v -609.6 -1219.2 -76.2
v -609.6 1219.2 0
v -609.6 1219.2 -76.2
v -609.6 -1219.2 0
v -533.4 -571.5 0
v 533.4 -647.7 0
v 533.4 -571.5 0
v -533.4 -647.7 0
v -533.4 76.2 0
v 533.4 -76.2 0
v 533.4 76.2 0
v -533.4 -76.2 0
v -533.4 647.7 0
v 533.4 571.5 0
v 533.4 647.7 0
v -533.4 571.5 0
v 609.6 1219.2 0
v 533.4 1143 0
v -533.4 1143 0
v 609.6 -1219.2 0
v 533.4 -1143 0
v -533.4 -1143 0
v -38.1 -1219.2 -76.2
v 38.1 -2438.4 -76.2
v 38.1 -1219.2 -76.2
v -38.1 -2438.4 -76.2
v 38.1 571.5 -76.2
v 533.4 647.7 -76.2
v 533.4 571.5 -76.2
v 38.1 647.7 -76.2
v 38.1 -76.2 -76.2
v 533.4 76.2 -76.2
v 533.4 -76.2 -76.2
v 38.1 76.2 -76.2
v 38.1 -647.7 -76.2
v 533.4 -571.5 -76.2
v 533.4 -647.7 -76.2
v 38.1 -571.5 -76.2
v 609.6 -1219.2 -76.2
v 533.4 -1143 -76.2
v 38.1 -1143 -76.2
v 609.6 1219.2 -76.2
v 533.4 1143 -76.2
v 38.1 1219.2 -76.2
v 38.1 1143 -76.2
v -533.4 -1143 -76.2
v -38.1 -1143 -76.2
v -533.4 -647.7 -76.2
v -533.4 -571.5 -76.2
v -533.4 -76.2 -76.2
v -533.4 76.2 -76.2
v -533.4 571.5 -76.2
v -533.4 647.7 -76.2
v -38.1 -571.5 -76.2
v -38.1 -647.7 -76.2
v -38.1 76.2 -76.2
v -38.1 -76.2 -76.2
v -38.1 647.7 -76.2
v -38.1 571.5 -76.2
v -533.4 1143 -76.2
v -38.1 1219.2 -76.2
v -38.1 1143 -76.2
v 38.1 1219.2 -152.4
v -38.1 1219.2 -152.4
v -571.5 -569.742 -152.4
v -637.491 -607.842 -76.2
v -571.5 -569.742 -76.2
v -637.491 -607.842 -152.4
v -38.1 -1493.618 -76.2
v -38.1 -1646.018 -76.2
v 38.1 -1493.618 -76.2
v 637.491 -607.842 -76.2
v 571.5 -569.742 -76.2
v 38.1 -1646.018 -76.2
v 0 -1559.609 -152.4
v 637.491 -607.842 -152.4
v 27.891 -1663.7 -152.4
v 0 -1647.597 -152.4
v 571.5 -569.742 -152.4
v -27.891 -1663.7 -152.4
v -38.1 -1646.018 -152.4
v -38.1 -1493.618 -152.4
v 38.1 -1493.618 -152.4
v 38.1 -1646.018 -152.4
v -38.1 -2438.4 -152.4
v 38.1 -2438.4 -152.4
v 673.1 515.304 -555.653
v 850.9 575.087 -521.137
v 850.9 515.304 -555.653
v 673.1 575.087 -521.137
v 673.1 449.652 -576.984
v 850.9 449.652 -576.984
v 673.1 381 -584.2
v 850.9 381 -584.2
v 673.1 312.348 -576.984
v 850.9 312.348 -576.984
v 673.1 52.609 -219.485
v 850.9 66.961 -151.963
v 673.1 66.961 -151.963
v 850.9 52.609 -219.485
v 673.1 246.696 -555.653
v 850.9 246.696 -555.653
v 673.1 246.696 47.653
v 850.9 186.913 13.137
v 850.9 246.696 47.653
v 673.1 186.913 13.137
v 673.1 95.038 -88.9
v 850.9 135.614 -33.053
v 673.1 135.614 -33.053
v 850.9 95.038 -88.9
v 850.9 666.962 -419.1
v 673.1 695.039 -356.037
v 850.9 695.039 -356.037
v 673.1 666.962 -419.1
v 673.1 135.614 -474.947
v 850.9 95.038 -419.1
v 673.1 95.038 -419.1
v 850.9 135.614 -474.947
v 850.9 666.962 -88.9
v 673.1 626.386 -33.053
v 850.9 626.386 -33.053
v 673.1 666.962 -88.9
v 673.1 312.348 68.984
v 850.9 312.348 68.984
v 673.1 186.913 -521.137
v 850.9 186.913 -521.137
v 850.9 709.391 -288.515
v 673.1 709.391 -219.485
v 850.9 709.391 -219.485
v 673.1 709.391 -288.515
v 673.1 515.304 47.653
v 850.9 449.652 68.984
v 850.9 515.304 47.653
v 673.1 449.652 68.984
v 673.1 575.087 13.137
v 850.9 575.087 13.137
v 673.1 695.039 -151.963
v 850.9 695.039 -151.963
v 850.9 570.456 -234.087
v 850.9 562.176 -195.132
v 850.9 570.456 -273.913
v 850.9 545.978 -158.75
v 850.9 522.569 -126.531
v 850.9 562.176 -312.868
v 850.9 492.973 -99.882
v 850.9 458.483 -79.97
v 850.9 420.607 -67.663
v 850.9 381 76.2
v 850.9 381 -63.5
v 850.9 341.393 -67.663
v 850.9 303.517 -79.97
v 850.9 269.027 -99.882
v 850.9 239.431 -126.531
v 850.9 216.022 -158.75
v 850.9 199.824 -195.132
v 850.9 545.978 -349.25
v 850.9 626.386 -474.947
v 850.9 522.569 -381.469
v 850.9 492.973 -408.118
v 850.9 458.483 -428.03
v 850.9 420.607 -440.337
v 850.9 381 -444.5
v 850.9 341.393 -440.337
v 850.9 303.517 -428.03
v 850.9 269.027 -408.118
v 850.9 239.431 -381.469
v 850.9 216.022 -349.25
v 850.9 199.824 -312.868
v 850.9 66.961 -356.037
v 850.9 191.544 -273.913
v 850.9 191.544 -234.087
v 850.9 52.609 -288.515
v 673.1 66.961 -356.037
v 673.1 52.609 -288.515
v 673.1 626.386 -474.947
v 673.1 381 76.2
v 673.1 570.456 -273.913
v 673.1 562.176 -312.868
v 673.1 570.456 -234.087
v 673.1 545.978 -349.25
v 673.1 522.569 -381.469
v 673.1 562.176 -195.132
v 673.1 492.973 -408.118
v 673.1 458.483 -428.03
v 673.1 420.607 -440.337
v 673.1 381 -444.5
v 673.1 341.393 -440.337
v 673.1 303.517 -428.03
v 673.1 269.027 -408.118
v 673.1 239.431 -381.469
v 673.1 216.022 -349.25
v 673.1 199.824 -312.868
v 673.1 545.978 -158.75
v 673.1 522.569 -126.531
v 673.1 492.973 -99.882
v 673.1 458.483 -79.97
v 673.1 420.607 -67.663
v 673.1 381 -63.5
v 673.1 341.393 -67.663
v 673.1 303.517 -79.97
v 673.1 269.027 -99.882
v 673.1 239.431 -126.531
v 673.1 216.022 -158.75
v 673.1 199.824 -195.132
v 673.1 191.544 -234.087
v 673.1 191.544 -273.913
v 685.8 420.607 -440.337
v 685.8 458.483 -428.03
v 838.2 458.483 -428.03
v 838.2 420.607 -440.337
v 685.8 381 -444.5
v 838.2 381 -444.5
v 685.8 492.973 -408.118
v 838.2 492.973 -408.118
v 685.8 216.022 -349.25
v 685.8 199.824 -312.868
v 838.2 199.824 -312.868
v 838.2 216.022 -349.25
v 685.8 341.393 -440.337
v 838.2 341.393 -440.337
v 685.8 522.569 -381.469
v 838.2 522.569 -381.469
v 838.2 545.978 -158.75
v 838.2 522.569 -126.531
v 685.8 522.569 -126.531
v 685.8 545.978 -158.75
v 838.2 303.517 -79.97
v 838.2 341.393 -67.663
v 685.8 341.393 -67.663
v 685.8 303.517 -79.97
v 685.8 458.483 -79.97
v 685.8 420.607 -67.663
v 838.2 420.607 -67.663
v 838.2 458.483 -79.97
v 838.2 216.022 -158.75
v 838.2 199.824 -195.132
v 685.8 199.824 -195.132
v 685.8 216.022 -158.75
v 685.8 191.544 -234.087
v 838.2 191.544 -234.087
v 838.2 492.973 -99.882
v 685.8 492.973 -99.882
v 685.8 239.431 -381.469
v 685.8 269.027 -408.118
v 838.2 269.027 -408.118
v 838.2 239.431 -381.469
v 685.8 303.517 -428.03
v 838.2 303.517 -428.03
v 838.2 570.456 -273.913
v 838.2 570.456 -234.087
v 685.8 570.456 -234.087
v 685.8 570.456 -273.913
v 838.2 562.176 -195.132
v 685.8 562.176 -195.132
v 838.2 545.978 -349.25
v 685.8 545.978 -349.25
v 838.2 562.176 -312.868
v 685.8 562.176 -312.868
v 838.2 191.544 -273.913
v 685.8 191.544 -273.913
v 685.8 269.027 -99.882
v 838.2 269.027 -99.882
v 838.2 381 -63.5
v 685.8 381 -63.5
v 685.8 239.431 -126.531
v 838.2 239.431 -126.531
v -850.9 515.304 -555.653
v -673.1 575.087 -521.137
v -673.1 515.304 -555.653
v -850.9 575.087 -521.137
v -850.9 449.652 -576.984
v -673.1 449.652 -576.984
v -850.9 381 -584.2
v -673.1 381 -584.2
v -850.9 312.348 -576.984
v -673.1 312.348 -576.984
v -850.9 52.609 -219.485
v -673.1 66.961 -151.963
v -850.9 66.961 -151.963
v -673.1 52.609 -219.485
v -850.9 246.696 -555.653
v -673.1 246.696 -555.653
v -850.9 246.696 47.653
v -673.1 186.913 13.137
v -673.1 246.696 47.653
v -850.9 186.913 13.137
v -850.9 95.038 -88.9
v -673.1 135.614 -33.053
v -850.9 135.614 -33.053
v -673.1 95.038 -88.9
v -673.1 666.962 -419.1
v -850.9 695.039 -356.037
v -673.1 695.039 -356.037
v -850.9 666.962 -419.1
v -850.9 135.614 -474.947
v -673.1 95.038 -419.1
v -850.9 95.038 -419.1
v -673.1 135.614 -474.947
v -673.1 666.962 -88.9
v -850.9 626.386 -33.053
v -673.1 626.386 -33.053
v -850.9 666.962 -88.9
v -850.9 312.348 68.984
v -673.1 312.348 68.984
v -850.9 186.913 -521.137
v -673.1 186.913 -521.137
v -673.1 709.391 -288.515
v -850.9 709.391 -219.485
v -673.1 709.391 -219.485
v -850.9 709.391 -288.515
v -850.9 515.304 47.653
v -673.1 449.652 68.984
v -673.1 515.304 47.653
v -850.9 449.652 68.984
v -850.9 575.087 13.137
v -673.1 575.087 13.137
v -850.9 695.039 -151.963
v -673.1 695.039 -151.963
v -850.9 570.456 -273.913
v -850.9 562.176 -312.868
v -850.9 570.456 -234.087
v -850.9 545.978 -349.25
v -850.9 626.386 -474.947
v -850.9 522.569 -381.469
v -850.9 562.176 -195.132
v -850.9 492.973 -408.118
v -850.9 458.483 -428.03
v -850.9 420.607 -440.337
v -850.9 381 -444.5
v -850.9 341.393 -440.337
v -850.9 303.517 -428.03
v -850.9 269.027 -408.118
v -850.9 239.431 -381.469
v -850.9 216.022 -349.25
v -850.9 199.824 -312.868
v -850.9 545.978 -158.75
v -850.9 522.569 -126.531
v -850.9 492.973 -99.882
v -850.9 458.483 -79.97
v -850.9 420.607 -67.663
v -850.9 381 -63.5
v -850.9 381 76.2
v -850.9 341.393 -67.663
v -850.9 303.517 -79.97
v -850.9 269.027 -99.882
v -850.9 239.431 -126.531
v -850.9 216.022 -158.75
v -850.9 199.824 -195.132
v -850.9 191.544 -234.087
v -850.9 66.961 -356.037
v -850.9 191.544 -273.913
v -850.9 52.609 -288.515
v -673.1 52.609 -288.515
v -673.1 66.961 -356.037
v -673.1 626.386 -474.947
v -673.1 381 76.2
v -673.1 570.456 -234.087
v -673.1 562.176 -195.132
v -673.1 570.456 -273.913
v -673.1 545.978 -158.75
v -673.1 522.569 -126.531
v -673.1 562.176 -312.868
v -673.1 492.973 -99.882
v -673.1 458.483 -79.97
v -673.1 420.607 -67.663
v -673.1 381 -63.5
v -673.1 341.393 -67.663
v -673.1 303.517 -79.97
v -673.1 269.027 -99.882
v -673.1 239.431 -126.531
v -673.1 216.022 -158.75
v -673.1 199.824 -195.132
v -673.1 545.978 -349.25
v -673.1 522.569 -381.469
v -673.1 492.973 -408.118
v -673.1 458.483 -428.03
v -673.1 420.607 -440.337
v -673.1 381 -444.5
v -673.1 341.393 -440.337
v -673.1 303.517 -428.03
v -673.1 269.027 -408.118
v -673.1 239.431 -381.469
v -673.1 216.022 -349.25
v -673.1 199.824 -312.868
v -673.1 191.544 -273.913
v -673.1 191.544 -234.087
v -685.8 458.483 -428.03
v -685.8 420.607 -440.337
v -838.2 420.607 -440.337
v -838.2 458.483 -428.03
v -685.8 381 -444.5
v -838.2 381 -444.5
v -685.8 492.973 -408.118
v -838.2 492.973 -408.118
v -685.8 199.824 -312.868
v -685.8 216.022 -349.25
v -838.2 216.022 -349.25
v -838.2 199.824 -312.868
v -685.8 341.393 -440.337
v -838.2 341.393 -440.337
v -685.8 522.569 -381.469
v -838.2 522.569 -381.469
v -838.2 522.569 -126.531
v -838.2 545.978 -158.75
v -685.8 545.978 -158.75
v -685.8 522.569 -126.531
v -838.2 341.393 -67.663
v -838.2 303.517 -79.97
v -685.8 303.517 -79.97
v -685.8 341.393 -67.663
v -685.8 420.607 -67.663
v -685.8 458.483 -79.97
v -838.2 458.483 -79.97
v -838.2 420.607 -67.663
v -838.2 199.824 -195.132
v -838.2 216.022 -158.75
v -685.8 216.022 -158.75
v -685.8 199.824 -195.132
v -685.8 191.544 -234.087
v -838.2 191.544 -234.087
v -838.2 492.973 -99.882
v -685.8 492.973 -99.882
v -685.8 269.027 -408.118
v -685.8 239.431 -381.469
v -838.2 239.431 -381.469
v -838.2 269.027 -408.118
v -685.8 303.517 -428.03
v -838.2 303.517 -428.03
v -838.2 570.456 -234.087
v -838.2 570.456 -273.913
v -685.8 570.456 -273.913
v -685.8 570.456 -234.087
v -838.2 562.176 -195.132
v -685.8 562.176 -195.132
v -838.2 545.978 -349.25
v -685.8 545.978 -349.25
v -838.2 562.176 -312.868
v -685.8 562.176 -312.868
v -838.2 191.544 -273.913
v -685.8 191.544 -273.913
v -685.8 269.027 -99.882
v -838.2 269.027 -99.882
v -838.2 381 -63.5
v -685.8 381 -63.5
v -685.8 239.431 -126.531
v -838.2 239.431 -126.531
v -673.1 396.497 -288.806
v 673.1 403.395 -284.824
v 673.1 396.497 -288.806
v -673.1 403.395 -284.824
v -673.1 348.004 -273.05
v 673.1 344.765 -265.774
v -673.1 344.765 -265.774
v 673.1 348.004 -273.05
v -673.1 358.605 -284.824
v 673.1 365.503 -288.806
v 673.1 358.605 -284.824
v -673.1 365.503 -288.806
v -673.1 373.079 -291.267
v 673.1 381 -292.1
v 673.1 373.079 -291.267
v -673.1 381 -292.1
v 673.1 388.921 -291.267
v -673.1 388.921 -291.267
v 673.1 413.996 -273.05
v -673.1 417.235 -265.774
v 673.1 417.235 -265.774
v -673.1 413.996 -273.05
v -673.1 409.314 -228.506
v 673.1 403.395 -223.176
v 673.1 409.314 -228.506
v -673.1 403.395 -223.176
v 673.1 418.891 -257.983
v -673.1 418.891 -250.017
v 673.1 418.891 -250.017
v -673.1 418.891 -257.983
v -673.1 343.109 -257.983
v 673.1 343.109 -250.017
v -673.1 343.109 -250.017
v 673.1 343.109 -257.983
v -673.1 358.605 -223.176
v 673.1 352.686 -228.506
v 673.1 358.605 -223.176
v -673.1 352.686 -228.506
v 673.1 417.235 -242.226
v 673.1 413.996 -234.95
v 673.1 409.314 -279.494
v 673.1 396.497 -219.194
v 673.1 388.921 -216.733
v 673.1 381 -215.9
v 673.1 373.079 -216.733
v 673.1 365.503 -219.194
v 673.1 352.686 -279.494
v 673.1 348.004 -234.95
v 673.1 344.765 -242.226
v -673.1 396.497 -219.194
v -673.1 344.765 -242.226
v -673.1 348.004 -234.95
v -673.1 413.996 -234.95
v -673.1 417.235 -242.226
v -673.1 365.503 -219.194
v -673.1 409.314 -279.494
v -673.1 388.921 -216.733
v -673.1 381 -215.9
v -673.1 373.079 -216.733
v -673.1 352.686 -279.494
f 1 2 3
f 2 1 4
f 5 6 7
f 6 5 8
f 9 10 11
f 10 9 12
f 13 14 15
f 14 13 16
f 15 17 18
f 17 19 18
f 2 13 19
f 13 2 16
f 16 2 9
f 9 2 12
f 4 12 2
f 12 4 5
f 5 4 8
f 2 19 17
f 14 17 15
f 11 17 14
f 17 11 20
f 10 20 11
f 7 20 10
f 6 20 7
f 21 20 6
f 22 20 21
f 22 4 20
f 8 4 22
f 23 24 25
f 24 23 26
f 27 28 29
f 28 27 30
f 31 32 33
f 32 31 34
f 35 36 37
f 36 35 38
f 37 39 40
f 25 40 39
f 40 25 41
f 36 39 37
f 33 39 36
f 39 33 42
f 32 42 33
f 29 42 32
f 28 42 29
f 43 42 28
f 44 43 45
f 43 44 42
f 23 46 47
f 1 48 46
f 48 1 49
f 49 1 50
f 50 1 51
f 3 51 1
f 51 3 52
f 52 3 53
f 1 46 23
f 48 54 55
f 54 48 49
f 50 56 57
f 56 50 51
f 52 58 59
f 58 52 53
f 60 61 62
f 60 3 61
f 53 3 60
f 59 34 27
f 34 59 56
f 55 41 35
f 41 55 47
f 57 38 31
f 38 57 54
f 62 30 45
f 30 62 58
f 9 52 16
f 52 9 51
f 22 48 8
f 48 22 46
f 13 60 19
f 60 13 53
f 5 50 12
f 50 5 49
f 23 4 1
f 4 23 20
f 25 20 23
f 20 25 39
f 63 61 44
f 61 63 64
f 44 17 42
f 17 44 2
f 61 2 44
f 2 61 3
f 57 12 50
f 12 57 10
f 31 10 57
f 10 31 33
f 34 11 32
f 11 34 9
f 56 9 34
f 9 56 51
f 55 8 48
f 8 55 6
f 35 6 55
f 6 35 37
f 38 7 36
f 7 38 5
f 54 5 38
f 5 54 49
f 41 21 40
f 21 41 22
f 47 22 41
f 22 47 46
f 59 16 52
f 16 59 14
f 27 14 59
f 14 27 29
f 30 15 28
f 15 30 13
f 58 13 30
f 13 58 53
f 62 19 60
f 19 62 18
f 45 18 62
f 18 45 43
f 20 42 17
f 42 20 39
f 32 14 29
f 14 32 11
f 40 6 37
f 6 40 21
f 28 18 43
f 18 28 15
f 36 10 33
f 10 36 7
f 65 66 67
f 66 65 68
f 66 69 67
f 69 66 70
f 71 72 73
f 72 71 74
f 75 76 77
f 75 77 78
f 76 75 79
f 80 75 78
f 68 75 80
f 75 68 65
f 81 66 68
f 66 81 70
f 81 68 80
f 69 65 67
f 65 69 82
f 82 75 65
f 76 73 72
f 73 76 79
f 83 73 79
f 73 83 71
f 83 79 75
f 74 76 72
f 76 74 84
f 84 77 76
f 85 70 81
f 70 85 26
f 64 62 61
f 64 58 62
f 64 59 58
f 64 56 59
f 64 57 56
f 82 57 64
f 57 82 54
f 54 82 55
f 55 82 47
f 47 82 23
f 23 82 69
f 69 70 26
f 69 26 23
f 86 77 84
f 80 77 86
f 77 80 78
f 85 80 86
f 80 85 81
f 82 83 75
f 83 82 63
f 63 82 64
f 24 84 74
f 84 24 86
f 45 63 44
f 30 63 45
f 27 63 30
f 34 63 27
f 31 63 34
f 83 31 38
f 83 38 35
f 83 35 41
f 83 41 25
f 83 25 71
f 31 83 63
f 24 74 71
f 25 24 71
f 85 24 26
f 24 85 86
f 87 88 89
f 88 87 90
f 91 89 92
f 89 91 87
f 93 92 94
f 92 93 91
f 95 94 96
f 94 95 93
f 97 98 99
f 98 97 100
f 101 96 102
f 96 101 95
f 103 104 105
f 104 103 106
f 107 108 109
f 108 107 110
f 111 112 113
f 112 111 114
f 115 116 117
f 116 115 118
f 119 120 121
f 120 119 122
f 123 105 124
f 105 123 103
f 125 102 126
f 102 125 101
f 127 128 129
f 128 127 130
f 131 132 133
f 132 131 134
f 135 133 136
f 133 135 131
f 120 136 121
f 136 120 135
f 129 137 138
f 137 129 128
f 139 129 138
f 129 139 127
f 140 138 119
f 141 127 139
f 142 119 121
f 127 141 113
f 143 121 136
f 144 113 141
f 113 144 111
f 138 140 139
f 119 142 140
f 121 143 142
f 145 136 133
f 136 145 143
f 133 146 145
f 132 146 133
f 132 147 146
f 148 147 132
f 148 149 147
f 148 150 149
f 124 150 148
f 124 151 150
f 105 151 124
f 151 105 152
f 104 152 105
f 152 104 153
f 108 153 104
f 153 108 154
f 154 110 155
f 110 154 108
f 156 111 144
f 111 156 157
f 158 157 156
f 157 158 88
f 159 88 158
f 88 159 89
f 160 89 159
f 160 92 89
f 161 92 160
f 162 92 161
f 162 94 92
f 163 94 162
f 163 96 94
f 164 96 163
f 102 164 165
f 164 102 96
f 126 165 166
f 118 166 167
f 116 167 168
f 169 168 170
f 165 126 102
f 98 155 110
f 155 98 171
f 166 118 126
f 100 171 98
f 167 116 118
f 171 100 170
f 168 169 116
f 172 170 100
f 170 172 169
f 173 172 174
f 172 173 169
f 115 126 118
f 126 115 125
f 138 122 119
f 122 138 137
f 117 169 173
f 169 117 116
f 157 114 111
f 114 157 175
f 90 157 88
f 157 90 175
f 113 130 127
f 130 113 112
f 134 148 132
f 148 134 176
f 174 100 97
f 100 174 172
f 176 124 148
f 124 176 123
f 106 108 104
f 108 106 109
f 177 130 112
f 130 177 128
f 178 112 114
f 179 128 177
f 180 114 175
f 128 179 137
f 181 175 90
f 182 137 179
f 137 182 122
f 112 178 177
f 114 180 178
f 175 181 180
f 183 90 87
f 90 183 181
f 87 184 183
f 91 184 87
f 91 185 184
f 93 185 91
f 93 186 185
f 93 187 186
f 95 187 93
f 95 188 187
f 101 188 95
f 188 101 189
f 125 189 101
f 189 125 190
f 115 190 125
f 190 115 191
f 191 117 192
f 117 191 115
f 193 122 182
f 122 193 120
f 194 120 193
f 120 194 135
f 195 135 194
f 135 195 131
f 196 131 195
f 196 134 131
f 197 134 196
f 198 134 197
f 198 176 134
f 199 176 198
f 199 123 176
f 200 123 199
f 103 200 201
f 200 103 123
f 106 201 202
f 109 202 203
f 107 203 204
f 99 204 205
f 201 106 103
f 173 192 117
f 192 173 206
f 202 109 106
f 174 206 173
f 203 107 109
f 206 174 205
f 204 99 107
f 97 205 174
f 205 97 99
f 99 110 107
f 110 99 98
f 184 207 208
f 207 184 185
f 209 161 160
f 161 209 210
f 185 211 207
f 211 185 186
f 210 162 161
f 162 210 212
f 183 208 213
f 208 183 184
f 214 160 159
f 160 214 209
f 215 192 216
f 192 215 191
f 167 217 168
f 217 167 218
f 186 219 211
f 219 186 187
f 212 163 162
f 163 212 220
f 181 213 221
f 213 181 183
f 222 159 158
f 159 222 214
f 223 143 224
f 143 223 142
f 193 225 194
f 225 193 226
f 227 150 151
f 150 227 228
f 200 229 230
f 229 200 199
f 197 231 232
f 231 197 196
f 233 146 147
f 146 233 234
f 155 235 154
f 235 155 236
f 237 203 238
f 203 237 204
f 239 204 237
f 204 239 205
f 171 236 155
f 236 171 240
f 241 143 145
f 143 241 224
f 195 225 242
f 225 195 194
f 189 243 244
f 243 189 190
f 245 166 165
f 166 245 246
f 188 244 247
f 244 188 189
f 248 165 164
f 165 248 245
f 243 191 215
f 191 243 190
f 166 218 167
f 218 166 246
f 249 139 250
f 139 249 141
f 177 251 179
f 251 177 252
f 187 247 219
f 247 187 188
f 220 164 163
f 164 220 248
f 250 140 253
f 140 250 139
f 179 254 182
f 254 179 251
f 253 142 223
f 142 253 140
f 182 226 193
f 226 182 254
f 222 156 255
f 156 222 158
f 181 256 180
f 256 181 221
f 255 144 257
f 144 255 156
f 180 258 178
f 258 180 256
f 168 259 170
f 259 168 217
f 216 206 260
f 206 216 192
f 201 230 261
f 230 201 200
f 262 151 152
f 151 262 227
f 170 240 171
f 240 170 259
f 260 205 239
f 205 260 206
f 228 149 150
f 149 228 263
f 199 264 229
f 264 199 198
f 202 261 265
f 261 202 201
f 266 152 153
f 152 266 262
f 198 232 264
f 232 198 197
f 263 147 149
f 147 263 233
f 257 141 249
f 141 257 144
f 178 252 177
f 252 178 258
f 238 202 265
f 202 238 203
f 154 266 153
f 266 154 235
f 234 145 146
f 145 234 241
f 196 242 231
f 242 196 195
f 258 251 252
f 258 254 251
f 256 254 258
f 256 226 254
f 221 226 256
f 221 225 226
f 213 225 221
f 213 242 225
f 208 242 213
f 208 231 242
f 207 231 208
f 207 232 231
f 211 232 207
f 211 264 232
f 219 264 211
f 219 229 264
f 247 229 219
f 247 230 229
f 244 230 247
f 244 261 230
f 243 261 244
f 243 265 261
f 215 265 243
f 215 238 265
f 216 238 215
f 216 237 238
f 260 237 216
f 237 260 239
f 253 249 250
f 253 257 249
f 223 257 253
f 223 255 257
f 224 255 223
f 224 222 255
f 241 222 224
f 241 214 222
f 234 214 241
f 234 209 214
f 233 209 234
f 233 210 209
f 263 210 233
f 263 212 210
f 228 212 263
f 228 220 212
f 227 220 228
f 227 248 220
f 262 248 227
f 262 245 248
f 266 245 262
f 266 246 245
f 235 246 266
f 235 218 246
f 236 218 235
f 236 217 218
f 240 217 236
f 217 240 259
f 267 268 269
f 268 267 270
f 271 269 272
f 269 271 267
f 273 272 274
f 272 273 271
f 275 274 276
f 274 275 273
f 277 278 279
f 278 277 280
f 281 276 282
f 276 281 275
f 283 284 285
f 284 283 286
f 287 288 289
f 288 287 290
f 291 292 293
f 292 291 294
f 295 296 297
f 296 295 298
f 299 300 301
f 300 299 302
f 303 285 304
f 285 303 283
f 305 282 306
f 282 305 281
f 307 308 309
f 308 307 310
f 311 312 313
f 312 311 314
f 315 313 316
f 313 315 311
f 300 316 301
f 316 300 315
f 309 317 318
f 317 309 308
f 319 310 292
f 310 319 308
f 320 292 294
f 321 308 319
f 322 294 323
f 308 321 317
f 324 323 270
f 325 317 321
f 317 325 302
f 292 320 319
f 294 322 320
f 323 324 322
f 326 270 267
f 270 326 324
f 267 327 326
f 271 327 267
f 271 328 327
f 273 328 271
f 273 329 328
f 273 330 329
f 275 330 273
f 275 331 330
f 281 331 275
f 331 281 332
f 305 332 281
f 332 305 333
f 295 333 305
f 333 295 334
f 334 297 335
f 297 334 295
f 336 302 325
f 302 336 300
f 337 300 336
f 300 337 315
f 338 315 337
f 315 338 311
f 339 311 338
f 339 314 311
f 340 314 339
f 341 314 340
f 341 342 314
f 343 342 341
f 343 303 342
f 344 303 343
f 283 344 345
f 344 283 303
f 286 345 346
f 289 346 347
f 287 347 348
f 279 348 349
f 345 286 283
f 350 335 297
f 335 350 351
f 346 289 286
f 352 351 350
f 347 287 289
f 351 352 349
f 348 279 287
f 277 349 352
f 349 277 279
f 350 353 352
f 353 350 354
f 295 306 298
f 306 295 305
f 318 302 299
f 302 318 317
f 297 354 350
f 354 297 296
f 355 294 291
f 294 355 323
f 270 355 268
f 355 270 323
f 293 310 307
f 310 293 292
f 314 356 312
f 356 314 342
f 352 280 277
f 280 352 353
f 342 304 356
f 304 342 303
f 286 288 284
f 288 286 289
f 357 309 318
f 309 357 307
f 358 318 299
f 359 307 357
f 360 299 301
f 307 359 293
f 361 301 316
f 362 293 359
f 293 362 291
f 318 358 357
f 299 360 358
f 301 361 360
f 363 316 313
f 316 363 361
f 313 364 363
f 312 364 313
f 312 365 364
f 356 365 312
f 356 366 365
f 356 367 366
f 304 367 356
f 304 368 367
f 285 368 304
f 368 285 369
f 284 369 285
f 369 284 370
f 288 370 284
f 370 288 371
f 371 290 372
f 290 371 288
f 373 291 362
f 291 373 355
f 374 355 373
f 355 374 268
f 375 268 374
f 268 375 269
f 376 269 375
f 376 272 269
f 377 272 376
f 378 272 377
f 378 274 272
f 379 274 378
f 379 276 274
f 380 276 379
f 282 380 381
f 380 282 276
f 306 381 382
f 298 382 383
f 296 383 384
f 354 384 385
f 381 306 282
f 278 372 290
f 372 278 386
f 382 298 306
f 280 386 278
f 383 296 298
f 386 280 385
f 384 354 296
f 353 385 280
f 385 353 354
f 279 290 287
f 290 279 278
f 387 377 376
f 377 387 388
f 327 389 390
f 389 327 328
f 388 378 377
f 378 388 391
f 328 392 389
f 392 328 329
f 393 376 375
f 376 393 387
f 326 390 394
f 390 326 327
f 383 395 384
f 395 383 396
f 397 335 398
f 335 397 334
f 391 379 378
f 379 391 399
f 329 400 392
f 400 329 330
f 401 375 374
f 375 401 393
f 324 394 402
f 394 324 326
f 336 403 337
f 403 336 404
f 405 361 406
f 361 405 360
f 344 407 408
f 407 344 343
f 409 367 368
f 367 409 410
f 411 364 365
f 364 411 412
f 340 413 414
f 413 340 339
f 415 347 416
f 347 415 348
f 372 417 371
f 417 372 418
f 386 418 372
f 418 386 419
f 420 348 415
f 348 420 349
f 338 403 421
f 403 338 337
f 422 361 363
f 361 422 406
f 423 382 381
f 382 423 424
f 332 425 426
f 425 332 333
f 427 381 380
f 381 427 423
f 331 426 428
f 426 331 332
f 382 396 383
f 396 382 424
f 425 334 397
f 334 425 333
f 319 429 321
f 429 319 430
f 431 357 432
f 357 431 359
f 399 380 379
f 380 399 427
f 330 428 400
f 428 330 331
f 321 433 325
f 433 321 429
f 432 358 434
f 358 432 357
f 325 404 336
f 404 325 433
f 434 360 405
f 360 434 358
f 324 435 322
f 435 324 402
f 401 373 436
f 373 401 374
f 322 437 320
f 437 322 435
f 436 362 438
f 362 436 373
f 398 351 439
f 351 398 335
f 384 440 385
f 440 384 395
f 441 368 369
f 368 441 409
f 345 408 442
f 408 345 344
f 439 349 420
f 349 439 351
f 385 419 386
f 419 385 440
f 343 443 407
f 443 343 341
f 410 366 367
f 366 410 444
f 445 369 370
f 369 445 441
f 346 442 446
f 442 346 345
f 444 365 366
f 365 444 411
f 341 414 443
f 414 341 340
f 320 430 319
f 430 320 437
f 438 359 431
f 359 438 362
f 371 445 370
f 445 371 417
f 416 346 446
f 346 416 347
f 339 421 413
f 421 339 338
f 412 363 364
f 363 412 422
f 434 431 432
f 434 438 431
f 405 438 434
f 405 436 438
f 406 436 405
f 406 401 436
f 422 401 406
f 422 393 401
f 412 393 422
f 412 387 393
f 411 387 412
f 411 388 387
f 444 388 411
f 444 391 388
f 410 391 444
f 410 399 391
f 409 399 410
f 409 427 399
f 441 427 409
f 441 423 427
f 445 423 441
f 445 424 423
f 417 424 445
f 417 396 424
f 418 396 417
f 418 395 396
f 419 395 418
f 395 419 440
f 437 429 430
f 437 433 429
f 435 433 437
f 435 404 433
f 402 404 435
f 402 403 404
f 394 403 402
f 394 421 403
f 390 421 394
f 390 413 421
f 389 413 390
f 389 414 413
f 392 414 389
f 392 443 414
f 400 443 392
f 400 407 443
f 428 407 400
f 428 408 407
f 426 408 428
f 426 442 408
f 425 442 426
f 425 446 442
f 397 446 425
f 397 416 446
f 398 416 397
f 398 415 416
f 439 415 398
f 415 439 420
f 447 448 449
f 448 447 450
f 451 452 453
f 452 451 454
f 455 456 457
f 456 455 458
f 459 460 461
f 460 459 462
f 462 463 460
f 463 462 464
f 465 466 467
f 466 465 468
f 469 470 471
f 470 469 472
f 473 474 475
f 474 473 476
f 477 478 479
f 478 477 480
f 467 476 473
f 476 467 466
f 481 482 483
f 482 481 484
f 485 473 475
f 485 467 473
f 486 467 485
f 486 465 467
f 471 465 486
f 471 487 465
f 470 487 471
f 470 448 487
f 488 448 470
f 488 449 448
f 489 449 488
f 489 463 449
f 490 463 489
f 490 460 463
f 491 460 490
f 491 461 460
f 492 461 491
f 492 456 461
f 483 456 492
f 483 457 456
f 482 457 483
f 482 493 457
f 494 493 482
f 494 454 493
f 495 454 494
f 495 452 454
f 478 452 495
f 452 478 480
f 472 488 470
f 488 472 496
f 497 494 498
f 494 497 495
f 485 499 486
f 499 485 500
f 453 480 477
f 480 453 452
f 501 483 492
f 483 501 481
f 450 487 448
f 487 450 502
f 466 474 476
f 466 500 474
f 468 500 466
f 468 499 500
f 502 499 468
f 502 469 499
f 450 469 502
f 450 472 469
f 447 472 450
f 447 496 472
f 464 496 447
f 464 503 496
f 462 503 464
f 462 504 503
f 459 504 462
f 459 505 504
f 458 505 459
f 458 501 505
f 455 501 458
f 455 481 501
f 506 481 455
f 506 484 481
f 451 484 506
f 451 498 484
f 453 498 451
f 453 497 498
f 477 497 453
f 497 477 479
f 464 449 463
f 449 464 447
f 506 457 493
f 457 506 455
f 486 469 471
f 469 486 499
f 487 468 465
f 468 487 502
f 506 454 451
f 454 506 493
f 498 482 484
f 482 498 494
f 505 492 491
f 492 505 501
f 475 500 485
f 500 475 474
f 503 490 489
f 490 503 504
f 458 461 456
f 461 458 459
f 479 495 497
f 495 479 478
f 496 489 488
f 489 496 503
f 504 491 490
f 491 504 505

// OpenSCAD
// file: wheel.scad
use <../lib/convert.scad>
use <../lib/colors.scad>

wheel_diameter = inches(15);
tire_diameter = inches(26);
tire_width = inches(7);
wheel_width = inches(6);

module wheel() {
  color_black()
  difference() {
      cylinder(h = tire_width, d = tire_diameter, center = true);
      cylinder(h = tire_width + inches(2), d = wheel_diameter, center = true);
  }
  color_steel()
    cylinder(h = wheel_width, d = wheel_diameter, center = true);
}

wheel();
// file: ../lib/colors.scad
module color_wood() {
  color("#F8D89D")
    children();
}

module color_hdpe() {
  color("#ccd")
    children();
}

module color_steel() {
  color("#888")
    children();
}

module color_white() {
  color("#fafafa")
    children();
}

module color_black() {
  color("#333")
    children();
}

module color_outside() {
  color("#90b0c4")
    children();
}
// file: ../lib/convert.scad
function inches(in) = in * 25.4;
function feet(ft) = inches(ft * 12);
// main file
use <../lib/convert.scad>
use <../lib/colors.scad>
use <../components/wheel.scad>

frame_width = feet(4);
frame_length = feet(8);
frame_thickness = inches(3);

module trailer_axel() {
  color_black()
  translate([0, inches(15), inches(-10)])
  rotate([0, 90, 0])
    cylinder(h = frame_width + inches(5), d = inches(3), center  = true);
}

module driver_wheel() {
  translate([feet(2.5), inches(15), inches(-10)])
  rotate([0, 90, 0])
    wheel();
}

module passenger_wheel() {
  mirror([1, 0, 0])
    driver_wheel();
}

module trailer_tongue() {
  union() {
    translate([inches(-1.5), 0, 0])
    rotate([0, 0, -60])
      cube([frame_width, frame_thickness, frame_thickness]);

    mirror([1, 0, 0])
    translate([inches(-1.5), 0, 0])
    rotate([0, 0, -60])
      cube([frame_width, frame_thickness, frame_thickness]);
  }
}

module trailer_frame_half() {
  union() {
    translate([(frame_width / 2) - frame_thickness, -frame_length / 2, 0])
      cube([frame_thickness, frame_length, frame_thickness]);

    translate([0, 0, 0])
      cube([frame_width / 2, frame_thickness, frame_thickness]);

    translate([0, -frame_thickness, 0])
      cube([frame_width / 2, frame_thickness, frame_thickness]);

    translate([0, (frame_length / 4) - (frame_thickness / 2), 0])
      cube([frame_width / 2, frame_thickness, frame_thickness]);

    translate([0, (frame_length / 2) - frame_thickness, 0])
      cube([frame_width / 2, frame_thickness, frame_thickness]);

    translate([0, -((frame_length / 4) + (frame_thickness / 2)), 0])
      cube([frame_width / 2, frame_thickness, frame_thickness]);

    translate([0, -(frame_length / 2), 0])
      cube([frame_width / 2, frame_thickness, frame_thickness]);
  }
}

module trailer_frame() {
  union() {
    trailer_frame_half();

    mirror([1, 0, 0])
      trailer_frame_half();
  }
}

module trailer() {
  translate([0, 0, -frame_thickness])
  color_black()
  rotate([0, 0, 180])
  union() {
    trailer_frame();

    translate([0, frame_length / 1.5, -frame_thickness])
    trailer_tongue();

    translate([0, frame_length / 4, -frame_thickness / 2])
      cube([frame_thickness, frame_length * 1.5, frame_thickness], center = true);
  }

  driver_wheel();
  passenger_wheel();
  trailer_axel();
}

trailer();
